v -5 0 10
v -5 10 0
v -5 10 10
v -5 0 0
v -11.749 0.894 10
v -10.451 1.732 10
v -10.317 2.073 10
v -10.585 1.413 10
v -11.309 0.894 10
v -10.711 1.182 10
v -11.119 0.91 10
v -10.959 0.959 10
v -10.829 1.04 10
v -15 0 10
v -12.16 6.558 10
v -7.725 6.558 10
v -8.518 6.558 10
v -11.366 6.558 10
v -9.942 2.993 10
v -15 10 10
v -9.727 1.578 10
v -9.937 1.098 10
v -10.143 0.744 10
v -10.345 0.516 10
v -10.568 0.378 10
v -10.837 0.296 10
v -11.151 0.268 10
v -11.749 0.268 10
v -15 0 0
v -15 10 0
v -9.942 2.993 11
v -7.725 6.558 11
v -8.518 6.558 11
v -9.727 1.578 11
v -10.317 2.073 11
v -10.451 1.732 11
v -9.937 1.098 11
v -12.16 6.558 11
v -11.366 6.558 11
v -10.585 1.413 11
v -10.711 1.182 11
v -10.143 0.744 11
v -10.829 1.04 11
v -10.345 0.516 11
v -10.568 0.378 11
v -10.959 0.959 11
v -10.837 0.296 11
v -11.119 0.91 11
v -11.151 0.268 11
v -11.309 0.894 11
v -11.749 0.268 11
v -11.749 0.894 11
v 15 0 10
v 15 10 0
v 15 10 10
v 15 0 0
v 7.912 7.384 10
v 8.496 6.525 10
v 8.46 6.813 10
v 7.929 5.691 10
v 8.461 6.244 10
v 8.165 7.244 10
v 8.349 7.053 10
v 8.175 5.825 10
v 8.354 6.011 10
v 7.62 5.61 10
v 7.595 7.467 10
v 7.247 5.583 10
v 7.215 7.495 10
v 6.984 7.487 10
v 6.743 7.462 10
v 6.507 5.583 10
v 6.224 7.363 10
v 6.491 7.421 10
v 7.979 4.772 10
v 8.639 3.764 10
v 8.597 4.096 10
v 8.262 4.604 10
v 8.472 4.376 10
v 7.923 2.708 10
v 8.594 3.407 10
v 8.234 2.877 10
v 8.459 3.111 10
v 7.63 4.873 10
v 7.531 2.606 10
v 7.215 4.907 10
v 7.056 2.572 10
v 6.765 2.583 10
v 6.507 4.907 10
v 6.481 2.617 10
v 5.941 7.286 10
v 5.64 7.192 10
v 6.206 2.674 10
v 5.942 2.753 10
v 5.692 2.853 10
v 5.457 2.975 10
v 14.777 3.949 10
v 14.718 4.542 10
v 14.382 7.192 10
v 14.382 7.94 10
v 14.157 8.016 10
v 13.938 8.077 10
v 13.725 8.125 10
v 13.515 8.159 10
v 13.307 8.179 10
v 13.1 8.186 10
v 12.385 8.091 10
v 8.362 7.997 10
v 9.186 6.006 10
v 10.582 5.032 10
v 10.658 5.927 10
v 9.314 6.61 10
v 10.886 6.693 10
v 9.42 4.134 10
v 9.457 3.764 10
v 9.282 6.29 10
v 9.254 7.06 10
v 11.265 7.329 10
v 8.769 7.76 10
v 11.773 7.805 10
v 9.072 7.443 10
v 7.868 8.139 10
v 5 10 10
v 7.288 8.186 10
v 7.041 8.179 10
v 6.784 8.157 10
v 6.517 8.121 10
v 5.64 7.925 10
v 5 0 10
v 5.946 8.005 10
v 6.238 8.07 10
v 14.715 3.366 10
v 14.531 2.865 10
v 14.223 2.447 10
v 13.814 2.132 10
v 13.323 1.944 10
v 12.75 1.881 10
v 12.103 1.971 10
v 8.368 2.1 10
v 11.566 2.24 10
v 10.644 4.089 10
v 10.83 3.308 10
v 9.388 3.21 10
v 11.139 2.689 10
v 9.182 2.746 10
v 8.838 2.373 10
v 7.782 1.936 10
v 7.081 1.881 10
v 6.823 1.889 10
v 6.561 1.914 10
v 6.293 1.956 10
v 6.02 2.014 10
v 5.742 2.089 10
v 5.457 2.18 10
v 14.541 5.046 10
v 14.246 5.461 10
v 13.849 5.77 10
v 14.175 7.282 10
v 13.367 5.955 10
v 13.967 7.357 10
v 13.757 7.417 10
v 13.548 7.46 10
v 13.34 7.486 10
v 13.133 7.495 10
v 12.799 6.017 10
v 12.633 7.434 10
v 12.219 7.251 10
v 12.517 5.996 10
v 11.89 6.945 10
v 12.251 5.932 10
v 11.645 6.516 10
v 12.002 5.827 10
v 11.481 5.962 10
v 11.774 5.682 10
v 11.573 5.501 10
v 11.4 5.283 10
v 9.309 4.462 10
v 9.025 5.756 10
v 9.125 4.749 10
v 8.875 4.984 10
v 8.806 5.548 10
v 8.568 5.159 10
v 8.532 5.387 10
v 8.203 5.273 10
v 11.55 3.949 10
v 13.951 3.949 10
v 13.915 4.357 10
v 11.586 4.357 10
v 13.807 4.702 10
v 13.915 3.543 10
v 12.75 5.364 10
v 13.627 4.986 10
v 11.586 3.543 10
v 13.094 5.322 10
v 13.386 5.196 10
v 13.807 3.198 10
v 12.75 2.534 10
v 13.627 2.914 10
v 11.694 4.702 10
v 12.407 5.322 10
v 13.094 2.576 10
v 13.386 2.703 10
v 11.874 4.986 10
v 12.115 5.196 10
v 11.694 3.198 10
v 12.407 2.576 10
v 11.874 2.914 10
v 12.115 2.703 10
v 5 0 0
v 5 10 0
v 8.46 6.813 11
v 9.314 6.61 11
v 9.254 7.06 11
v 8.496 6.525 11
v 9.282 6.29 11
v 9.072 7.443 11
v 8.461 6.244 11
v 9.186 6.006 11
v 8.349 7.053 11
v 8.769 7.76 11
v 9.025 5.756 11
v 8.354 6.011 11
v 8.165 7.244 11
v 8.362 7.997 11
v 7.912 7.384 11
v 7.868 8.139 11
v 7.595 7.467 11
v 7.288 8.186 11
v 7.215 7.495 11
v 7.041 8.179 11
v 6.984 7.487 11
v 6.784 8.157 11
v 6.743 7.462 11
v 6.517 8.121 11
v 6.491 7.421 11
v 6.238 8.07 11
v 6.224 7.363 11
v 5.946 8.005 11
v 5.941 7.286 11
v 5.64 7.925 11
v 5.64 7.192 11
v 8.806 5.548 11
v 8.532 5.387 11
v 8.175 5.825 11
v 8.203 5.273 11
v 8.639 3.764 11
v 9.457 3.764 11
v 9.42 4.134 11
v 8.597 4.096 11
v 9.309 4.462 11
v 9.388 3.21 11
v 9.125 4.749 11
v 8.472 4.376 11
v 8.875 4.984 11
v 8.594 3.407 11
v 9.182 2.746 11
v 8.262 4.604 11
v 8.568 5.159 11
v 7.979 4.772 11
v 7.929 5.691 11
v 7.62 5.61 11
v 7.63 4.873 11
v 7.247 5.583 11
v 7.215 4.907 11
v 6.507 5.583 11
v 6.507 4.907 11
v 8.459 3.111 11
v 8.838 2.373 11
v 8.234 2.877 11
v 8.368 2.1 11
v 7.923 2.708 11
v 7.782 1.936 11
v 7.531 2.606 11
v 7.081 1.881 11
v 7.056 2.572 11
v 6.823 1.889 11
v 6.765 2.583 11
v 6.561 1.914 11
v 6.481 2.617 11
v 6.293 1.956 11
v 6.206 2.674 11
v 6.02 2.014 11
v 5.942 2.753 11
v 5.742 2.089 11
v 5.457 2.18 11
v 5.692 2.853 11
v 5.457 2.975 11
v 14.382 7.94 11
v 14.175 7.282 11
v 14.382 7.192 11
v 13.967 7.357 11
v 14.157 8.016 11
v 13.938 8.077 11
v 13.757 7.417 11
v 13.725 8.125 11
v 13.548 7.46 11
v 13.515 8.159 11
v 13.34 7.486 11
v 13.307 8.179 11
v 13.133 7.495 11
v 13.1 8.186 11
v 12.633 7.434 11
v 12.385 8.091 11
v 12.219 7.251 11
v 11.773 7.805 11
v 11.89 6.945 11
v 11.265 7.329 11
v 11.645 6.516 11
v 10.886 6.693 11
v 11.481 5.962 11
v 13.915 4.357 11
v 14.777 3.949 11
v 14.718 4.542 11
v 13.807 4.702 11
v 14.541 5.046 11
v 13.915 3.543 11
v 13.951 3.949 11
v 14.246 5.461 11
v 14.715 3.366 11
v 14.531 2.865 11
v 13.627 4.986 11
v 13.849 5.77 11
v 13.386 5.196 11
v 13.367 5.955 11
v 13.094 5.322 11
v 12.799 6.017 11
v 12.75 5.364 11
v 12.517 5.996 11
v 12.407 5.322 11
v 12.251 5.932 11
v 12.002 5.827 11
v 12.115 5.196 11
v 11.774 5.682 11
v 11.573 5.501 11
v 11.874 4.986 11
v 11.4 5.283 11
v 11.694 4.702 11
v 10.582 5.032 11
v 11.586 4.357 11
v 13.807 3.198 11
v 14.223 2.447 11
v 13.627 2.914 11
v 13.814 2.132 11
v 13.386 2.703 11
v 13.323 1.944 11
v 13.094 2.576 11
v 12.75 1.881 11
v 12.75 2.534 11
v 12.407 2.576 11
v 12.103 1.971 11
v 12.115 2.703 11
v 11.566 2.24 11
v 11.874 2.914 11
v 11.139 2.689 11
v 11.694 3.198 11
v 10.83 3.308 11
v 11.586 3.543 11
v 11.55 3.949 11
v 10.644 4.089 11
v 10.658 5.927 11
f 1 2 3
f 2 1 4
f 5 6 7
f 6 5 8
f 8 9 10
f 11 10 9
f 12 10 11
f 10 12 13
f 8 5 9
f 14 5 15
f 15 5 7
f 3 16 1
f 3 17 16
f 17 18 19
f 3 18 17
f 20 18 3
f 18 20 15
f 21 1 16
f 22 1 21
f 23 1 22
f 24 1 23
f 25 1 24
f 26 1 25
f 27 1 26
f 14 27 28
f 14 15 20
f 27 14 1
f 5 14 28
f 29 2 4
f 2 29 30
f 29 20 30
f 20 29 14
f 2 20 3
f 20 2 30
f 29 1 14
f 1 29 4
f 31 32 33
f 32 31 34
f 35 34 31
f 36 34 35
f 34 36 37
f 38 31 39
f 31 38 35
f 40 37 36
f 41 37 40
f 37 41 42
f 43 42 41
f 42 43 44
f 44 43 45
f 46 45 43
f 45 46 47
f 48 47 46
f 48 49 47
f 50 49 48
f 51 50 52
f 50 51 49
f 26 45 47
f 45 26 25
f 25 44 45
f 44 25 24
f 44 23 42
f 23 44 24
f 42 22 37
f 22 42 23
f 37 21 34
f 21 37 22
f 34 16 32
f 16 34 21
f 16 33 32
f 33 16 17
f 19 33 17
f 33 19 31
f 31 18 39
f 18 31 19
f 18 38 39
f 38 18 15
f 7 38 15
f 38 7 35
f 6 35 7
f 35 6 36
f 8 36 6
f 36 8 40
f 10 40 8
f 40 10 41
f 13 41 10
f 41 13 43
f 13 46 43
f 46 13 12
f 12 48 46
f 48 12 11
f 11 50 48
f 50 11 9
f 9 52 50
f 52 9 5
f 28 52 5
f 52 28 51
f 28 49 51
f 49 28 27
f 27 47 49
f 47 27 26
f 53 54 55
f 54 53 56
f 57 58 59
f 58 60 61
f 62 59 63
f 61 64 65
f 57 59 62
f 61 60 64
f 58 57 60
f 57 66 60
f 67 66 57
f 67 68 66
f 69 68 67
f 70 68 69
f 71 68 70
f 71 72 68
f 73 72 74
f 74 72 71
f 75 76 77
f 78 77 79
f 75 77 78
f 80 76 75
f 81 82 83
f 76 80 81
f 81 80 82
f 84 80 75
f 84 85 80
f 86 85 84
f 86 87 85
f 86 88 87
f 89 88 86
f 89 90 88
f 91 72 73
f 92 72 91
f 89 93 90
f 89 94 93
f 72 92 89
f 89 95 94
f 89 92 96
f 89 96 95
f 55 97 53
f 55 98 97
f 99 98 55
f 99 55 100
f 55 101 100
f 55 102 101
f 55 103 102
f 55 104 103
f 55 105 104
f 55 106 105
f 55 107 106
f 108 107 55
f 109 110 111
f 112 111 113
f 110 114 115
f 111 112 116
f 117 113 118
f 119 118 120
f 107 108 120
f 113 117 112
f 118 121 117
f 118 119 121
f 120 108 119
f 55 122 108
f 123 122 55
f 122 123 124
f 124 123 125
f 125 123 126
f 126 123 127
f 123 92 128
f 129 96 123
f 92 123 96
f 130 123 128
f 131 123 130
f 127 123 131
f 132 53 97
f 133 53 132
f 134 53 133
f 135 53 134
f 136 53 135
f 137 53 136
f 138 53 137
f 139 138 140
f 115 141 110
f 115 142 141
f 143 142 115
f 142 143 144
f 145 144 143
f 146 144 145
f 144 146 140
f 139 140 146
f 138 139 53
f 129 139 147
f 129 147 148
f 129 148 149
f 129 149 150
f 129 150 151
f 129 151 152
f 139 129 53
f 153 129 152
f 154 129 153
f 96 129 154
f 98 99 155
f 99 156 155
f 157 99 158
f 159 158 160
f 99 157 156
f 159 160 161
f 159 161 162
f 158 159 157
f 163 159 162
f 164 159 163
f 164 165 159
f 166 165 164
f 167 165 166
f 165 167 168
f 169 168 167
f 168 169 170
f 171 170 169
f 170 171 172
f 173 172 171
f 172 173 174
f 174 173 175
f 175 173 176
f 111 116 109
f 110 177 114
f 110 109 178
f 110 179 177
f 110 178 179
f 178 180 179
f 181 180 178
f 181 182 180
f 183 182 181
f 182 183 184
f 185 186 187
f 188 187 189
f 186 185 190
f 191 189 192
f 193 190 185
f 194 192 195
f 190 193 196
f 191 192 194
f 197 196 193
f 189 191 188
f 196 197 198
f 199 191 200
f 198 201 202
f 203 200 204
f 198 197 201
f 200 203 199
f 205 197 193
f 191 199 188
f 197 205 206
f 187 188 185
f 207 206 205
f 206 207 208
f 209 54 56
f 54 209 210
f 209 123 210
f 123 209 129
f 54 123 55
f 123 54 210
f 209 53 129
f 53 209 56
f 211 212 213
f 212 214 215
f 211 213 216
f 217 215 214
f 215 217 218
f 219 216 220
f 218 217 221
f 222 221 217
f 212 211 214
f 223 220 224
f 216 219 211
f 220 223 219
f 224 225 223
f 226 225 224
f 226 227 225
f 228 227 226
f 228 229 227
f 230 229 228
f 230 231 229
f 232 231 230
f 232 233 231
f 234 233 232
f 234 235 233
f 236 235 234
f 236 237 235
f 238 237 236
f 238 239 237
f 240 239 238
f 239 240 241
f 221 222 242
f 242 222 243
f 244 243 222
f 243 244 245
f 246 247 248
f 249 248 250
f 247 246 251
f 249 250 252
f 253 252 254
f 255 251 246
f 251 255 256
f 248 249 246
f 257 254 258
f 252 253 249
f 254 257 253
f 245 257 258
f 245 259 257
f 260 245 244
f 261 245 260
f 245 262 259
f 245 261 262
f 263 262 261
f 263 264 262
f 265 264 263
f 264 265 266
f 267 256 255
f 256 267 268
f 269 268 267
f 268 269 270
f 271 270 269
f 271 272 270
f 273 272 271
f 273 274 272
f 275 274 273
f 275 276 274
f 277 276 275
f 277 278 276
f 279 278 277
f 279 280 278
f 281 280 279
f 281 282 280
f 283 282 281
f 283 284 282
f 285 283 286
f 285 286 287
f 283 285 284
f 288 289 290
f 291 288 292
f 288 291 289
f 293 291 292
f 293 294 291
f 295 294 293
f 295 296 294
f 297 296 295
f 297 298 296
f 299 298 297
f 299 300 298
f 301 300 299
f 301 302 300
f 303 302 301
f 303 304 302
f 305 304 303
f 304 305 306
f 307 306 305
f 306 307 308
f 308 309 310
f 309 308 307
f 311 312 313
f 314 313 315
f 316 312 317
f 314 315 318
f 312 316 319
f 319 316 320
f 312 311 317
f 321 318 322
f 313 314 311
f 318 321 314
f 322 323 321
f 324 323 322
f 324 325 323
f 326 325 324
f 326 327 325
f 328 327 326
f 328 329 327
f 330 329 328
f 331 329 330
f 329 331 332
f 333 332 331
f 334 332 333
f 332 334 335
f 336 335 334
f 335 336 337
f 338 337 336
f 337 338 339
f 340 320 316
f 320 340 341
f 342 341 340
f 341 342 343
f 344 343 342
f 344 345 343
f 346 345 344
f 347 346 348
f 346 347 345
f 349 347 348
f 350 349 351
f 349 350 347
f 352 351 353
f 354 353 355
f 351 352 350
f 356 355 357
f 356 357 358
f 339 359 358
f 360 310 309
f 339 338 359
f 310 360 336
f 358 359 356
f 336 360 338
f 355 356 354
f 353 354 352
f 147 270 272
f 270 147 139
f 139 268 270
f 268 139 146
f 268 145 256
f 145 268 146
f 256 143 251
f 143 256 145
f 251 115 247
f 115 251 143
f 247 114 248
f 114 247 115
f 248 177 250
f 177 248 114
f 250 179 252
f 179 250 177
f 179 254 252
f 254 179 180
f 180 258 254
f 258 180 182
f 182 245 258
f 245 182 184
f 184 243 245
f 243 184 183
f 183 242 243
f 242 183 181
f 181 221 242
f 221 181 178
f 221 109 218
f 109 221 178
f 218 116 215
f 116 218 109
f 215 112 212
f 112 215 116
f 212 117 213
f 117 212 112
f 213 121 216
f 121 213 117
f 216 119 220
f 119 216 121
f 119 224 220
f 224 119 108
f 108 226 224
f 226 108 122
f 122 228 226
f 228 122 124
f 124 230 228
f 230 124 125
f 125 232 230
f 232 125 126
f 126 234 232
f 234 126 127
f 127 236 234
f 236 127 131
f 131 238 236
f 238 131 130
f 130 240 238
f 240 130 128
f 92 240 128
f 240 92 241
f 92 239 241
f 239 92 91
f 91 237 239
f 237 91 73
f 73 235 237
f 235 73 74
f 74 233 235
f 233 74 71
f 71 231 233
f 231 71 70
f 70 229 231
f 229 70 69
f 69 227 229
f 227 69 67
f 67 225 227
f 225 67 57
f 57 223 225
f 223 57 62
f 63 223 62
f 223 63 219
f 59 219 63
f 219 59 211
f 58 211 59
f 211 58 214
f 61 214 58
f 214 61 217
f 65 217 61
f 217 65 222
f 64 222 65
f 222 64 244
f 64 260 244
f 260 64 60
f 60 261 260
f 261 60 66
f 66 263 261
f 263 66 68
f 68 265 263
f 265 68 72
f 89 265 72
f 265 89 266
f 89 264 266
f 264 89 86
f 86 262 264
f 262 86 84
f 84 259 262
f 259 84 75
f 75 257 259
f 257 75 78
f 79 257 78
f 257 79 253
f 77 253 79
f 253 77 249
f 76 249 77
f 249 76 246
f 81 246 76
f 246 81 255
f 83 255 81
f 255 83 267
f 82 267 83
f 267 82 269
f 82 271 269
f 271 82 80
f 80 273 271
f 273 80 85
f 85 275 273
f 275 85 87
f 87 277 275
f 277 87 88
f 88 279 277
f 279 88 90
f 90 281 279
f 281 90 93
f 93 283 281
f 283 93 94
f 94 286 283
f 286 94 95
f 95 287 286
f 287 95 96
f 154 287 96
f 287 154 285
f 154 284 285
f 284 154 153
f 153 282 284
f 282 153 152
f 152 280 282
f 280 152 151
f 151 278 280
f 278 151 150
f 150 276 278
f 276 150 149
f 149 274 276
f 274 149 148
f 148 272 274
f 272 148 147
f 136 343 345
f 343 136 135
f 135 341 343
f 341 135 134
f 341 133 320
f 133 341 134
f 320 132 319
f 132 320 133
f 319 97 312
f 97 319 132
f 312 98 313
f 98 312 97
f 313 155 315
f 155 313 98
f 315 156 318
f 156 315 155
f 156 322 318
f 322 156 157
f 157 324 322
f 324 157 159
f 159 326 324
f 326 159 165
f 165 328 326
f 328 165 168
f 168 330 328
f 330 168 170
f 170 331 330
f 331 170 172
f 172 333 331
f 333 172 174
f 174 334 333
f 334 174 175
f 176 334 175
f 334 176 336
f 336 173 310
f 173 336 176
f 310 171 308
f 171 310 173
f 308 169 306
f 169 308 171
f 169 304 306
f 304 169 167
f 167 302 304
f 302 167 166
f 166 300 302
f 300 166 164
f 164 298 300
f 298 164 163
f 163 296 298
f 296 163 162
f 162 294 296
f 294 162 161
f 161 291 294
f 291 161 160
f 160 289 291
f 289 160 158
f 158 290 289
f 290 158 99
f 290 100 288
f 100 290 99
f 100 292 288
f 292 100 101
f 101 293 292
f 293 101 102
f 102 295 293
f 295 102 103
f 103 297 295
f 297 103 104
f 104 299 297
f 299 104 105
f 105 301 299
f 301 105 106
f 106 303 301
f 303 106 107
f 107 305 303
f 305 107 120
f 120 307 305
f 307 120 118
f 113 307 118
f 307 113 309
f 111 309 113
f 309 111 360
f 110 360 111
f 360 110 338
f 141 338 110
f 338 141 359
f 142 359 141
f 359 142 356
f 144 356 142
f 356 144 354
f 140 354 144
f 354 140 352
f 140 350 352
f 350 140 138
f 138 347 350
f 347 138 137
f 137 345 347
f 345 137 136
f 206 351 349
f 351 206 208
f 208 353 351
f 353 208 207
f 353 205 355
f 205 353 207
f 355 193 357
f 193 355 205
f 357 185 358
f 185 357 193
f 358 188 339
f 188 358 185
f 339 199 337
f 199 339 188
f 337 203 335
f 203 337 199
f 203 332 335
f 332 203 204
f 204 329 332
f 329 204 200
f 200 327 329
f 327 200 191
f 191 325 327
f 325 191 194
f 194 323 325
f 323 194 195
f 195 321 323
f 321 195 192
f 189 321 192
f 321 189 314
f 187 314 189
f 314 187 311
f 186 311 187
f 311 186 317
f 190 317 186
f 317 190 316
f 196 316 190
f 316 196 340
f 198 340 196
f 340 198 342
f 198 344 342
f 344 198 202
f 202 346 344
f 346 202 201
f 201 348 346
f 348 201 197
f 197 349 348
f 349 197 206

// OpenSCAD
// -*- mode: SCAD ; c-file-style: "ellemtel" ; coding: utf-8 -*-
//
// Rough extruder offest calibration
// Extruder one part
// Just a few simple blocks
//
// © 2017 Roland Sieker <ospalh@gmail.com>
// Licence: CC-BY-SA 4.0


font_name = "Demos LT";
// font_name = "Palatino";
// font_name = "serif";
// font_name = "bugger, haven’t got this one";
font_name_2 = "Demos X";

translate([-15, 0, 0])
{
   cube([10,10,10]);
   translate([5, 2, 10])
   {
      linear_extrude(1)
      {
         text("y", 6, font=font_name, halign="center", valgin="center");
      }
   }
}
translate([5, 0, 0])
{
   cube([10,10,10]);
   translate([5, 2, 10])
   {
      linear_extrude(1)
      {
         text("36", 6, font=font_name_2, halign="center", valgin="center");
      }
   }
}
